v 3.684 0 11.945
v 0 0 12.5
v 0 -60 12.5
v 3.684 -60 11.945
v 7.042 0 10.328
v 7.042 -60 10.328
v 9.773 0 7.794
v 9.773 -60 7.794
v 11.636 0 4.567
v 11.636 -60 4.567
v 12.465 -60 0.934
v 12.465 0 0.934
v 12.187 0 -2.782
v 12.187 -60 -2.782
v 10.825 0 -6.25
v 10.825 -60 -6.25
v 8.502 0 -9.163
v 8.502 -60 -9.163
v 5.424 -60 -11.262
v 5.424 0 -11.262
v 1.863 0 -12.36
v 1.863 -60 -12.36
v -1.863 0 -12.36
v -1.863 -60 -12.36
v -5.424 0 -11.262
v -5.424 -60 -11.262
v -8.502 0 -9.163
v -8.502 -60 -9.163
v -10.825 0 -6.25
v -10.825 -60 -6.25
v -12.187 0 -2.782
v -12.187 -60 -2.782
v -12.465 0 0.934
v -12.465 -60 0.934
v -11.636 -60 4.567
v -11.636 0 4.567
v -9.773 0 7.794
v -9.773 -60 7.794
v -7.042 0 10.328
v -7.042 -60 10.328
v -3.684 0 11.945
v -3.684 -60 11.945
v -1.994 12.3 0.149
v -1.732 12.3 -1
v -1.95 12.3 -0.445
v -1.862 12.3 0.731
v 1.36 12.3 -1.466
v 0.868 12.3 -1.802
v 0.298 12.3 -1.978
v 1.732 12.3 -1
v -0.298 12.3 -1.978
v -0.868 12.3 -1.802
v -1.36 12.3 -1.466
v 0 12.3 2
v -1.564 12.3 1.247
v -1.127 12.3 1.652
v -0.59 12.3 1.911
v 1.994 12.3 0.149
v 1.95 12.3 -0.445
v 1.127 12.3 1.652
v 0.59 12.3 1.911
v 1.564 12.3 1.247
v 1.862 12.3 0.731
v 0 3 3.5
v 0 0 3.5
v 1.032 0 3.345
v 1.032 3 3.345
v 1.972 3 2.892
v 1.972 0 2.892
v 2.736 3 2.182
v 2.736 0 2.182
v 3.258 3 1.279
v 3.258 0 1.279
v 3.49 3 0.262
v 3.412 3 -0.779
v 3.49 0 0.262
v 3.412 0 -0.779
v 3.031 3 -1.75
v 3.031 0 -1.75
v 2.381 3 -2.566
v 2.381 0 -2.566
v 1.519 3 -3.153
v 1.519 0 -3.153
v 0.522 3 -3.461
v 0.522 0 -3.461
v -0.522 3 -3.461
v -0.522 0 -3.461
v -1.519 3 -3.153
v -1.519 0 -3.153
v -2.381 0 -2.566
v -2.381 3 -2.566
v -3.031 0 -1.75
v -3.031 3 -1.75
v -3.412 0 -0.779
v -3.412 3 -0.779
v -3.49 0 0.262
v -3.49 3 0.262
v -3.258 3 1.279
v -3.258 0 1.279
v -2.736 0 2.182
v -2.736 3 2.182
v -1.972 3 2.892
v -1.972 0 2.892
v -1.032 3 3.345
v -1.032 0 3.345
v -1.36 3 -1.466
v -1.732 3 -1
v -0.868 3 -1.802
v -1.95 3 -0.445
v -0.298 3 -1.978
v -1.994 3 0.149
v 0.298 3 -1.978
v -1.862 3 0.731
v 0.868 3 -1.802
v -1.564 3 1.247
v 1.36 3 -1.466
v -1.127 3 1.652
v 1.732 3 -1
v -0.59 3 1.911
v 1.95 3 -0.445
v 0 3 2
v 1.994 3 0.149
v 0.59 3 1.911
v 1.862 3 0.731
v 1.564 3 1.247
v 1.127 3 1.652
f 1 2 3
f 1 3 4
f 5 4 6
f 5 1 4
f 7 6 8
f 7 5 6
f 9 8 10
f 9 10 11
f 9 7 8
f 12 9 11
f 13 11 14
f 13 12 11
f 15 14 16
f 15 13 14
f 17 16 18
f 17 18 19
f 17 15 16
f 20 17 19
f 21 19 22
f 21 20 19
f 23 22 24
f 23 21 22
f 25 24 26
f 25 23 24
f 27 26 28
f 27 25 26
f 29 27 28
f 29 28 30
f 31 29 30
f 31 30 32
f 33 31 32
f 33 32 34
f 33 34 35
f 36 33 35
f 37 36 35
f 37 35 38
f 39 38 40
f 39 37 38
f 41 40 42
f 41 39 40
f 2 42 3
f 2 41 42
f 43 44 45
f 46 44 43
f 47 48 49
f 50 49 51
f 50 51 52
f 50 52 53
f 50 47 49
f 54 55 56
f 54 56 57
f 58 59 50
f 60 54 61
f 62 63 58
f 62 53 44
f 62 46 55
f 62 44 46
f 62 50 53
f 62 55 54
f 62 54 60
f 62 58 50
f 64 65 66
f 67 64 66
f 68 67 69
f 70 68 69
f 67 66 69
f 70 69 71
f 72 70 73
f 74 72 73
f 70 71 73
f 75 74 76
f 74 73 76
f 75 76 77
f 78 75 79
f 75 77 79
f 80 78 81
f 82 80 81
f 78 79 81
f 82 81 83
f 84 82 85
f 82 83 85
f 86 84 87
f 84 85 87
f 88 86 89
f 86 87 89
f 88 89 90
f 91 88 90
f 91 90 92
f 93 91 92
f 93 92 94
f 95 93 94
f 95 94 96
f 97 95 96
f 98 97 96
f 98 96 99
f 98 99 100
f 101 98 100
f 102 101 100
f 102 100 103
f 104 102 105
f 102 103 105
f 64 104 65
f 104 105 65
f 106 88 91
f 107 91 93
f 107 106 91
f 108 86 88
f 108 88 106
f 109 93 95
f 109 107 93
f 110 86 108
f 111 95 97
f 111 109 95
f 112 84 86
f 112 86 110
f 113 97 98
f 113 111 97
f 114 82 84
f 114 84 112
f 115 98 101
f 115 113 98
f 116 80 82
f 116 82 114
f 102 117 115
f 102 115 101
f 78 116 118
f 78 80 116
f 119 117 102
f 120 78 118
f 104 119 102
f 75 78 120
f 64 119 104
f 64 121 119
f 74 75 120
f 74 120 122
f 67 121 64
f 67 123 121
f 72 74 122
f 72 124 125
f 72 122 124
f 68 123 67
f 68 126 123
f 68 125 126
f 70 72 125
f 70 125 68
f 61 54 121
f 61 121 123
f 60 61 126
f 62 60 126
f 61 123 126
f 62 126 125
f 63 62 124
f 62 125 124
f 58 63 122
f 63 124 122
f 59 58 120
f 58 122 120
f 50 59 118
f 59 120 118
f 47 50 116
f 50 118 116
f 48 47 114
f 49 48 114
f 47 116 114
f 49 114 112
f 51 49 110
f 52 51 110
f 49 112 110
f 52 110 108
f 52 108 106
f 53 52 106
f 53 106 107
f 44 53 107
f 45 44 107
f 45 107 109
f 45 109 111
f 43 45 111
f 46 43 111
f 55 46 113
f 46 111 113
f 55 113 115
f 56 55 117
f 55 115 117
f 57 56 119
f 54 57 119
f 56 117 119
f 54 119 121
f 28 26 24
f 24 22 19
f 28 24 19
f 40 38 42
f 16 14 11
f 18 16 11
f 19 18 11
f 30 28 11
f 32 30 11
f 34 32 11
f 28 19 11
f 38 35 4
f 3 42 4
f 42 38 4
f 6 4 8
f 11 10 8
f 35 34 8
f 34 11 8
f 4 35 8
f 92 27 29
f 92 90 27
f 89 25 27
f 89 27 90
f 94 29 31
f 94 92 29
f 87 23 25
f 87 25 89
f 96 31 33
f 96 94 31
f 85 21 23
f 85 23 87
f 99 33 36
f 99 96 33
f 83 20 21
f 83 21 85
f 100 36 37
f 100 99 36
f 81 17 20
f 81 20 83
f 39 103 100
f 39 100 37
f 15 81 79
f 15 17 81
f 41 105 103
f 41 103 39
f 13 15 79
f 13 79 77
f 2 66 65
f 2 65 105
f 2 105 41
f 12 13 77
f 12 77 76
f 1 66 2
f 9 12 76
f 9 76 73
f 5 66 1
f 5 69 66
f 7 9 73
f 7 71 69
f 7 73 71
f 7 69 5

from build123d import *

# Parameters (mm, degrees)
SKETCH1_R           = 12.5
BOSS_EXTRUDE1_DEPTH = 60
SKETCH2_R           = 3.5
BOSS_EXTRUDE2_DEPTH = 3
SKETCH3_R           = 2
BOSS_EXTRUDE3_DEPTH = 9.3


with BuildPart() as part:
    # Sketch1 → Boss-Extrude1 (new body)
    with BuildSketch(Plane(origin=(0, 0, 0), x_dir=(1, 0, 0), z_dir=(0, 1, 0))):
        with Locations(Location((0, 0, 0), (0, 0, 270))):
            Circle(SKETCH1_R)
    extrude(amount=-BOSS_EXTRUDE1_DEPTH)

    # Sketch2 → Boss-Extrude2 (add)
    with BuildSketch(Plane(origin=(0, 0, 0), x_dir=(1, 0, 0), z_dir=(0, 1, 0))):
        with Locations(Location((0, 0, 0), (0, 0, 270))):
            Circle(SKETCH2_R)
    extrude(amount=BOSS_EXTRUDE2_DEPTH)

    # Sketch3 → Boss-Extrude3 (add)
    with BuildSketch(Plane(origin=(0, 3, 0), x_dir=(1, 0, 0), z_dir=(0, 1, 0))):
        with Locations(Location((0, 0, 0), (0, 0, 270))):
            Circle(SKETCH3_R)
    extrude(amount=BOSS_EXTRUDE3_DEPTH)


solid = part.part
